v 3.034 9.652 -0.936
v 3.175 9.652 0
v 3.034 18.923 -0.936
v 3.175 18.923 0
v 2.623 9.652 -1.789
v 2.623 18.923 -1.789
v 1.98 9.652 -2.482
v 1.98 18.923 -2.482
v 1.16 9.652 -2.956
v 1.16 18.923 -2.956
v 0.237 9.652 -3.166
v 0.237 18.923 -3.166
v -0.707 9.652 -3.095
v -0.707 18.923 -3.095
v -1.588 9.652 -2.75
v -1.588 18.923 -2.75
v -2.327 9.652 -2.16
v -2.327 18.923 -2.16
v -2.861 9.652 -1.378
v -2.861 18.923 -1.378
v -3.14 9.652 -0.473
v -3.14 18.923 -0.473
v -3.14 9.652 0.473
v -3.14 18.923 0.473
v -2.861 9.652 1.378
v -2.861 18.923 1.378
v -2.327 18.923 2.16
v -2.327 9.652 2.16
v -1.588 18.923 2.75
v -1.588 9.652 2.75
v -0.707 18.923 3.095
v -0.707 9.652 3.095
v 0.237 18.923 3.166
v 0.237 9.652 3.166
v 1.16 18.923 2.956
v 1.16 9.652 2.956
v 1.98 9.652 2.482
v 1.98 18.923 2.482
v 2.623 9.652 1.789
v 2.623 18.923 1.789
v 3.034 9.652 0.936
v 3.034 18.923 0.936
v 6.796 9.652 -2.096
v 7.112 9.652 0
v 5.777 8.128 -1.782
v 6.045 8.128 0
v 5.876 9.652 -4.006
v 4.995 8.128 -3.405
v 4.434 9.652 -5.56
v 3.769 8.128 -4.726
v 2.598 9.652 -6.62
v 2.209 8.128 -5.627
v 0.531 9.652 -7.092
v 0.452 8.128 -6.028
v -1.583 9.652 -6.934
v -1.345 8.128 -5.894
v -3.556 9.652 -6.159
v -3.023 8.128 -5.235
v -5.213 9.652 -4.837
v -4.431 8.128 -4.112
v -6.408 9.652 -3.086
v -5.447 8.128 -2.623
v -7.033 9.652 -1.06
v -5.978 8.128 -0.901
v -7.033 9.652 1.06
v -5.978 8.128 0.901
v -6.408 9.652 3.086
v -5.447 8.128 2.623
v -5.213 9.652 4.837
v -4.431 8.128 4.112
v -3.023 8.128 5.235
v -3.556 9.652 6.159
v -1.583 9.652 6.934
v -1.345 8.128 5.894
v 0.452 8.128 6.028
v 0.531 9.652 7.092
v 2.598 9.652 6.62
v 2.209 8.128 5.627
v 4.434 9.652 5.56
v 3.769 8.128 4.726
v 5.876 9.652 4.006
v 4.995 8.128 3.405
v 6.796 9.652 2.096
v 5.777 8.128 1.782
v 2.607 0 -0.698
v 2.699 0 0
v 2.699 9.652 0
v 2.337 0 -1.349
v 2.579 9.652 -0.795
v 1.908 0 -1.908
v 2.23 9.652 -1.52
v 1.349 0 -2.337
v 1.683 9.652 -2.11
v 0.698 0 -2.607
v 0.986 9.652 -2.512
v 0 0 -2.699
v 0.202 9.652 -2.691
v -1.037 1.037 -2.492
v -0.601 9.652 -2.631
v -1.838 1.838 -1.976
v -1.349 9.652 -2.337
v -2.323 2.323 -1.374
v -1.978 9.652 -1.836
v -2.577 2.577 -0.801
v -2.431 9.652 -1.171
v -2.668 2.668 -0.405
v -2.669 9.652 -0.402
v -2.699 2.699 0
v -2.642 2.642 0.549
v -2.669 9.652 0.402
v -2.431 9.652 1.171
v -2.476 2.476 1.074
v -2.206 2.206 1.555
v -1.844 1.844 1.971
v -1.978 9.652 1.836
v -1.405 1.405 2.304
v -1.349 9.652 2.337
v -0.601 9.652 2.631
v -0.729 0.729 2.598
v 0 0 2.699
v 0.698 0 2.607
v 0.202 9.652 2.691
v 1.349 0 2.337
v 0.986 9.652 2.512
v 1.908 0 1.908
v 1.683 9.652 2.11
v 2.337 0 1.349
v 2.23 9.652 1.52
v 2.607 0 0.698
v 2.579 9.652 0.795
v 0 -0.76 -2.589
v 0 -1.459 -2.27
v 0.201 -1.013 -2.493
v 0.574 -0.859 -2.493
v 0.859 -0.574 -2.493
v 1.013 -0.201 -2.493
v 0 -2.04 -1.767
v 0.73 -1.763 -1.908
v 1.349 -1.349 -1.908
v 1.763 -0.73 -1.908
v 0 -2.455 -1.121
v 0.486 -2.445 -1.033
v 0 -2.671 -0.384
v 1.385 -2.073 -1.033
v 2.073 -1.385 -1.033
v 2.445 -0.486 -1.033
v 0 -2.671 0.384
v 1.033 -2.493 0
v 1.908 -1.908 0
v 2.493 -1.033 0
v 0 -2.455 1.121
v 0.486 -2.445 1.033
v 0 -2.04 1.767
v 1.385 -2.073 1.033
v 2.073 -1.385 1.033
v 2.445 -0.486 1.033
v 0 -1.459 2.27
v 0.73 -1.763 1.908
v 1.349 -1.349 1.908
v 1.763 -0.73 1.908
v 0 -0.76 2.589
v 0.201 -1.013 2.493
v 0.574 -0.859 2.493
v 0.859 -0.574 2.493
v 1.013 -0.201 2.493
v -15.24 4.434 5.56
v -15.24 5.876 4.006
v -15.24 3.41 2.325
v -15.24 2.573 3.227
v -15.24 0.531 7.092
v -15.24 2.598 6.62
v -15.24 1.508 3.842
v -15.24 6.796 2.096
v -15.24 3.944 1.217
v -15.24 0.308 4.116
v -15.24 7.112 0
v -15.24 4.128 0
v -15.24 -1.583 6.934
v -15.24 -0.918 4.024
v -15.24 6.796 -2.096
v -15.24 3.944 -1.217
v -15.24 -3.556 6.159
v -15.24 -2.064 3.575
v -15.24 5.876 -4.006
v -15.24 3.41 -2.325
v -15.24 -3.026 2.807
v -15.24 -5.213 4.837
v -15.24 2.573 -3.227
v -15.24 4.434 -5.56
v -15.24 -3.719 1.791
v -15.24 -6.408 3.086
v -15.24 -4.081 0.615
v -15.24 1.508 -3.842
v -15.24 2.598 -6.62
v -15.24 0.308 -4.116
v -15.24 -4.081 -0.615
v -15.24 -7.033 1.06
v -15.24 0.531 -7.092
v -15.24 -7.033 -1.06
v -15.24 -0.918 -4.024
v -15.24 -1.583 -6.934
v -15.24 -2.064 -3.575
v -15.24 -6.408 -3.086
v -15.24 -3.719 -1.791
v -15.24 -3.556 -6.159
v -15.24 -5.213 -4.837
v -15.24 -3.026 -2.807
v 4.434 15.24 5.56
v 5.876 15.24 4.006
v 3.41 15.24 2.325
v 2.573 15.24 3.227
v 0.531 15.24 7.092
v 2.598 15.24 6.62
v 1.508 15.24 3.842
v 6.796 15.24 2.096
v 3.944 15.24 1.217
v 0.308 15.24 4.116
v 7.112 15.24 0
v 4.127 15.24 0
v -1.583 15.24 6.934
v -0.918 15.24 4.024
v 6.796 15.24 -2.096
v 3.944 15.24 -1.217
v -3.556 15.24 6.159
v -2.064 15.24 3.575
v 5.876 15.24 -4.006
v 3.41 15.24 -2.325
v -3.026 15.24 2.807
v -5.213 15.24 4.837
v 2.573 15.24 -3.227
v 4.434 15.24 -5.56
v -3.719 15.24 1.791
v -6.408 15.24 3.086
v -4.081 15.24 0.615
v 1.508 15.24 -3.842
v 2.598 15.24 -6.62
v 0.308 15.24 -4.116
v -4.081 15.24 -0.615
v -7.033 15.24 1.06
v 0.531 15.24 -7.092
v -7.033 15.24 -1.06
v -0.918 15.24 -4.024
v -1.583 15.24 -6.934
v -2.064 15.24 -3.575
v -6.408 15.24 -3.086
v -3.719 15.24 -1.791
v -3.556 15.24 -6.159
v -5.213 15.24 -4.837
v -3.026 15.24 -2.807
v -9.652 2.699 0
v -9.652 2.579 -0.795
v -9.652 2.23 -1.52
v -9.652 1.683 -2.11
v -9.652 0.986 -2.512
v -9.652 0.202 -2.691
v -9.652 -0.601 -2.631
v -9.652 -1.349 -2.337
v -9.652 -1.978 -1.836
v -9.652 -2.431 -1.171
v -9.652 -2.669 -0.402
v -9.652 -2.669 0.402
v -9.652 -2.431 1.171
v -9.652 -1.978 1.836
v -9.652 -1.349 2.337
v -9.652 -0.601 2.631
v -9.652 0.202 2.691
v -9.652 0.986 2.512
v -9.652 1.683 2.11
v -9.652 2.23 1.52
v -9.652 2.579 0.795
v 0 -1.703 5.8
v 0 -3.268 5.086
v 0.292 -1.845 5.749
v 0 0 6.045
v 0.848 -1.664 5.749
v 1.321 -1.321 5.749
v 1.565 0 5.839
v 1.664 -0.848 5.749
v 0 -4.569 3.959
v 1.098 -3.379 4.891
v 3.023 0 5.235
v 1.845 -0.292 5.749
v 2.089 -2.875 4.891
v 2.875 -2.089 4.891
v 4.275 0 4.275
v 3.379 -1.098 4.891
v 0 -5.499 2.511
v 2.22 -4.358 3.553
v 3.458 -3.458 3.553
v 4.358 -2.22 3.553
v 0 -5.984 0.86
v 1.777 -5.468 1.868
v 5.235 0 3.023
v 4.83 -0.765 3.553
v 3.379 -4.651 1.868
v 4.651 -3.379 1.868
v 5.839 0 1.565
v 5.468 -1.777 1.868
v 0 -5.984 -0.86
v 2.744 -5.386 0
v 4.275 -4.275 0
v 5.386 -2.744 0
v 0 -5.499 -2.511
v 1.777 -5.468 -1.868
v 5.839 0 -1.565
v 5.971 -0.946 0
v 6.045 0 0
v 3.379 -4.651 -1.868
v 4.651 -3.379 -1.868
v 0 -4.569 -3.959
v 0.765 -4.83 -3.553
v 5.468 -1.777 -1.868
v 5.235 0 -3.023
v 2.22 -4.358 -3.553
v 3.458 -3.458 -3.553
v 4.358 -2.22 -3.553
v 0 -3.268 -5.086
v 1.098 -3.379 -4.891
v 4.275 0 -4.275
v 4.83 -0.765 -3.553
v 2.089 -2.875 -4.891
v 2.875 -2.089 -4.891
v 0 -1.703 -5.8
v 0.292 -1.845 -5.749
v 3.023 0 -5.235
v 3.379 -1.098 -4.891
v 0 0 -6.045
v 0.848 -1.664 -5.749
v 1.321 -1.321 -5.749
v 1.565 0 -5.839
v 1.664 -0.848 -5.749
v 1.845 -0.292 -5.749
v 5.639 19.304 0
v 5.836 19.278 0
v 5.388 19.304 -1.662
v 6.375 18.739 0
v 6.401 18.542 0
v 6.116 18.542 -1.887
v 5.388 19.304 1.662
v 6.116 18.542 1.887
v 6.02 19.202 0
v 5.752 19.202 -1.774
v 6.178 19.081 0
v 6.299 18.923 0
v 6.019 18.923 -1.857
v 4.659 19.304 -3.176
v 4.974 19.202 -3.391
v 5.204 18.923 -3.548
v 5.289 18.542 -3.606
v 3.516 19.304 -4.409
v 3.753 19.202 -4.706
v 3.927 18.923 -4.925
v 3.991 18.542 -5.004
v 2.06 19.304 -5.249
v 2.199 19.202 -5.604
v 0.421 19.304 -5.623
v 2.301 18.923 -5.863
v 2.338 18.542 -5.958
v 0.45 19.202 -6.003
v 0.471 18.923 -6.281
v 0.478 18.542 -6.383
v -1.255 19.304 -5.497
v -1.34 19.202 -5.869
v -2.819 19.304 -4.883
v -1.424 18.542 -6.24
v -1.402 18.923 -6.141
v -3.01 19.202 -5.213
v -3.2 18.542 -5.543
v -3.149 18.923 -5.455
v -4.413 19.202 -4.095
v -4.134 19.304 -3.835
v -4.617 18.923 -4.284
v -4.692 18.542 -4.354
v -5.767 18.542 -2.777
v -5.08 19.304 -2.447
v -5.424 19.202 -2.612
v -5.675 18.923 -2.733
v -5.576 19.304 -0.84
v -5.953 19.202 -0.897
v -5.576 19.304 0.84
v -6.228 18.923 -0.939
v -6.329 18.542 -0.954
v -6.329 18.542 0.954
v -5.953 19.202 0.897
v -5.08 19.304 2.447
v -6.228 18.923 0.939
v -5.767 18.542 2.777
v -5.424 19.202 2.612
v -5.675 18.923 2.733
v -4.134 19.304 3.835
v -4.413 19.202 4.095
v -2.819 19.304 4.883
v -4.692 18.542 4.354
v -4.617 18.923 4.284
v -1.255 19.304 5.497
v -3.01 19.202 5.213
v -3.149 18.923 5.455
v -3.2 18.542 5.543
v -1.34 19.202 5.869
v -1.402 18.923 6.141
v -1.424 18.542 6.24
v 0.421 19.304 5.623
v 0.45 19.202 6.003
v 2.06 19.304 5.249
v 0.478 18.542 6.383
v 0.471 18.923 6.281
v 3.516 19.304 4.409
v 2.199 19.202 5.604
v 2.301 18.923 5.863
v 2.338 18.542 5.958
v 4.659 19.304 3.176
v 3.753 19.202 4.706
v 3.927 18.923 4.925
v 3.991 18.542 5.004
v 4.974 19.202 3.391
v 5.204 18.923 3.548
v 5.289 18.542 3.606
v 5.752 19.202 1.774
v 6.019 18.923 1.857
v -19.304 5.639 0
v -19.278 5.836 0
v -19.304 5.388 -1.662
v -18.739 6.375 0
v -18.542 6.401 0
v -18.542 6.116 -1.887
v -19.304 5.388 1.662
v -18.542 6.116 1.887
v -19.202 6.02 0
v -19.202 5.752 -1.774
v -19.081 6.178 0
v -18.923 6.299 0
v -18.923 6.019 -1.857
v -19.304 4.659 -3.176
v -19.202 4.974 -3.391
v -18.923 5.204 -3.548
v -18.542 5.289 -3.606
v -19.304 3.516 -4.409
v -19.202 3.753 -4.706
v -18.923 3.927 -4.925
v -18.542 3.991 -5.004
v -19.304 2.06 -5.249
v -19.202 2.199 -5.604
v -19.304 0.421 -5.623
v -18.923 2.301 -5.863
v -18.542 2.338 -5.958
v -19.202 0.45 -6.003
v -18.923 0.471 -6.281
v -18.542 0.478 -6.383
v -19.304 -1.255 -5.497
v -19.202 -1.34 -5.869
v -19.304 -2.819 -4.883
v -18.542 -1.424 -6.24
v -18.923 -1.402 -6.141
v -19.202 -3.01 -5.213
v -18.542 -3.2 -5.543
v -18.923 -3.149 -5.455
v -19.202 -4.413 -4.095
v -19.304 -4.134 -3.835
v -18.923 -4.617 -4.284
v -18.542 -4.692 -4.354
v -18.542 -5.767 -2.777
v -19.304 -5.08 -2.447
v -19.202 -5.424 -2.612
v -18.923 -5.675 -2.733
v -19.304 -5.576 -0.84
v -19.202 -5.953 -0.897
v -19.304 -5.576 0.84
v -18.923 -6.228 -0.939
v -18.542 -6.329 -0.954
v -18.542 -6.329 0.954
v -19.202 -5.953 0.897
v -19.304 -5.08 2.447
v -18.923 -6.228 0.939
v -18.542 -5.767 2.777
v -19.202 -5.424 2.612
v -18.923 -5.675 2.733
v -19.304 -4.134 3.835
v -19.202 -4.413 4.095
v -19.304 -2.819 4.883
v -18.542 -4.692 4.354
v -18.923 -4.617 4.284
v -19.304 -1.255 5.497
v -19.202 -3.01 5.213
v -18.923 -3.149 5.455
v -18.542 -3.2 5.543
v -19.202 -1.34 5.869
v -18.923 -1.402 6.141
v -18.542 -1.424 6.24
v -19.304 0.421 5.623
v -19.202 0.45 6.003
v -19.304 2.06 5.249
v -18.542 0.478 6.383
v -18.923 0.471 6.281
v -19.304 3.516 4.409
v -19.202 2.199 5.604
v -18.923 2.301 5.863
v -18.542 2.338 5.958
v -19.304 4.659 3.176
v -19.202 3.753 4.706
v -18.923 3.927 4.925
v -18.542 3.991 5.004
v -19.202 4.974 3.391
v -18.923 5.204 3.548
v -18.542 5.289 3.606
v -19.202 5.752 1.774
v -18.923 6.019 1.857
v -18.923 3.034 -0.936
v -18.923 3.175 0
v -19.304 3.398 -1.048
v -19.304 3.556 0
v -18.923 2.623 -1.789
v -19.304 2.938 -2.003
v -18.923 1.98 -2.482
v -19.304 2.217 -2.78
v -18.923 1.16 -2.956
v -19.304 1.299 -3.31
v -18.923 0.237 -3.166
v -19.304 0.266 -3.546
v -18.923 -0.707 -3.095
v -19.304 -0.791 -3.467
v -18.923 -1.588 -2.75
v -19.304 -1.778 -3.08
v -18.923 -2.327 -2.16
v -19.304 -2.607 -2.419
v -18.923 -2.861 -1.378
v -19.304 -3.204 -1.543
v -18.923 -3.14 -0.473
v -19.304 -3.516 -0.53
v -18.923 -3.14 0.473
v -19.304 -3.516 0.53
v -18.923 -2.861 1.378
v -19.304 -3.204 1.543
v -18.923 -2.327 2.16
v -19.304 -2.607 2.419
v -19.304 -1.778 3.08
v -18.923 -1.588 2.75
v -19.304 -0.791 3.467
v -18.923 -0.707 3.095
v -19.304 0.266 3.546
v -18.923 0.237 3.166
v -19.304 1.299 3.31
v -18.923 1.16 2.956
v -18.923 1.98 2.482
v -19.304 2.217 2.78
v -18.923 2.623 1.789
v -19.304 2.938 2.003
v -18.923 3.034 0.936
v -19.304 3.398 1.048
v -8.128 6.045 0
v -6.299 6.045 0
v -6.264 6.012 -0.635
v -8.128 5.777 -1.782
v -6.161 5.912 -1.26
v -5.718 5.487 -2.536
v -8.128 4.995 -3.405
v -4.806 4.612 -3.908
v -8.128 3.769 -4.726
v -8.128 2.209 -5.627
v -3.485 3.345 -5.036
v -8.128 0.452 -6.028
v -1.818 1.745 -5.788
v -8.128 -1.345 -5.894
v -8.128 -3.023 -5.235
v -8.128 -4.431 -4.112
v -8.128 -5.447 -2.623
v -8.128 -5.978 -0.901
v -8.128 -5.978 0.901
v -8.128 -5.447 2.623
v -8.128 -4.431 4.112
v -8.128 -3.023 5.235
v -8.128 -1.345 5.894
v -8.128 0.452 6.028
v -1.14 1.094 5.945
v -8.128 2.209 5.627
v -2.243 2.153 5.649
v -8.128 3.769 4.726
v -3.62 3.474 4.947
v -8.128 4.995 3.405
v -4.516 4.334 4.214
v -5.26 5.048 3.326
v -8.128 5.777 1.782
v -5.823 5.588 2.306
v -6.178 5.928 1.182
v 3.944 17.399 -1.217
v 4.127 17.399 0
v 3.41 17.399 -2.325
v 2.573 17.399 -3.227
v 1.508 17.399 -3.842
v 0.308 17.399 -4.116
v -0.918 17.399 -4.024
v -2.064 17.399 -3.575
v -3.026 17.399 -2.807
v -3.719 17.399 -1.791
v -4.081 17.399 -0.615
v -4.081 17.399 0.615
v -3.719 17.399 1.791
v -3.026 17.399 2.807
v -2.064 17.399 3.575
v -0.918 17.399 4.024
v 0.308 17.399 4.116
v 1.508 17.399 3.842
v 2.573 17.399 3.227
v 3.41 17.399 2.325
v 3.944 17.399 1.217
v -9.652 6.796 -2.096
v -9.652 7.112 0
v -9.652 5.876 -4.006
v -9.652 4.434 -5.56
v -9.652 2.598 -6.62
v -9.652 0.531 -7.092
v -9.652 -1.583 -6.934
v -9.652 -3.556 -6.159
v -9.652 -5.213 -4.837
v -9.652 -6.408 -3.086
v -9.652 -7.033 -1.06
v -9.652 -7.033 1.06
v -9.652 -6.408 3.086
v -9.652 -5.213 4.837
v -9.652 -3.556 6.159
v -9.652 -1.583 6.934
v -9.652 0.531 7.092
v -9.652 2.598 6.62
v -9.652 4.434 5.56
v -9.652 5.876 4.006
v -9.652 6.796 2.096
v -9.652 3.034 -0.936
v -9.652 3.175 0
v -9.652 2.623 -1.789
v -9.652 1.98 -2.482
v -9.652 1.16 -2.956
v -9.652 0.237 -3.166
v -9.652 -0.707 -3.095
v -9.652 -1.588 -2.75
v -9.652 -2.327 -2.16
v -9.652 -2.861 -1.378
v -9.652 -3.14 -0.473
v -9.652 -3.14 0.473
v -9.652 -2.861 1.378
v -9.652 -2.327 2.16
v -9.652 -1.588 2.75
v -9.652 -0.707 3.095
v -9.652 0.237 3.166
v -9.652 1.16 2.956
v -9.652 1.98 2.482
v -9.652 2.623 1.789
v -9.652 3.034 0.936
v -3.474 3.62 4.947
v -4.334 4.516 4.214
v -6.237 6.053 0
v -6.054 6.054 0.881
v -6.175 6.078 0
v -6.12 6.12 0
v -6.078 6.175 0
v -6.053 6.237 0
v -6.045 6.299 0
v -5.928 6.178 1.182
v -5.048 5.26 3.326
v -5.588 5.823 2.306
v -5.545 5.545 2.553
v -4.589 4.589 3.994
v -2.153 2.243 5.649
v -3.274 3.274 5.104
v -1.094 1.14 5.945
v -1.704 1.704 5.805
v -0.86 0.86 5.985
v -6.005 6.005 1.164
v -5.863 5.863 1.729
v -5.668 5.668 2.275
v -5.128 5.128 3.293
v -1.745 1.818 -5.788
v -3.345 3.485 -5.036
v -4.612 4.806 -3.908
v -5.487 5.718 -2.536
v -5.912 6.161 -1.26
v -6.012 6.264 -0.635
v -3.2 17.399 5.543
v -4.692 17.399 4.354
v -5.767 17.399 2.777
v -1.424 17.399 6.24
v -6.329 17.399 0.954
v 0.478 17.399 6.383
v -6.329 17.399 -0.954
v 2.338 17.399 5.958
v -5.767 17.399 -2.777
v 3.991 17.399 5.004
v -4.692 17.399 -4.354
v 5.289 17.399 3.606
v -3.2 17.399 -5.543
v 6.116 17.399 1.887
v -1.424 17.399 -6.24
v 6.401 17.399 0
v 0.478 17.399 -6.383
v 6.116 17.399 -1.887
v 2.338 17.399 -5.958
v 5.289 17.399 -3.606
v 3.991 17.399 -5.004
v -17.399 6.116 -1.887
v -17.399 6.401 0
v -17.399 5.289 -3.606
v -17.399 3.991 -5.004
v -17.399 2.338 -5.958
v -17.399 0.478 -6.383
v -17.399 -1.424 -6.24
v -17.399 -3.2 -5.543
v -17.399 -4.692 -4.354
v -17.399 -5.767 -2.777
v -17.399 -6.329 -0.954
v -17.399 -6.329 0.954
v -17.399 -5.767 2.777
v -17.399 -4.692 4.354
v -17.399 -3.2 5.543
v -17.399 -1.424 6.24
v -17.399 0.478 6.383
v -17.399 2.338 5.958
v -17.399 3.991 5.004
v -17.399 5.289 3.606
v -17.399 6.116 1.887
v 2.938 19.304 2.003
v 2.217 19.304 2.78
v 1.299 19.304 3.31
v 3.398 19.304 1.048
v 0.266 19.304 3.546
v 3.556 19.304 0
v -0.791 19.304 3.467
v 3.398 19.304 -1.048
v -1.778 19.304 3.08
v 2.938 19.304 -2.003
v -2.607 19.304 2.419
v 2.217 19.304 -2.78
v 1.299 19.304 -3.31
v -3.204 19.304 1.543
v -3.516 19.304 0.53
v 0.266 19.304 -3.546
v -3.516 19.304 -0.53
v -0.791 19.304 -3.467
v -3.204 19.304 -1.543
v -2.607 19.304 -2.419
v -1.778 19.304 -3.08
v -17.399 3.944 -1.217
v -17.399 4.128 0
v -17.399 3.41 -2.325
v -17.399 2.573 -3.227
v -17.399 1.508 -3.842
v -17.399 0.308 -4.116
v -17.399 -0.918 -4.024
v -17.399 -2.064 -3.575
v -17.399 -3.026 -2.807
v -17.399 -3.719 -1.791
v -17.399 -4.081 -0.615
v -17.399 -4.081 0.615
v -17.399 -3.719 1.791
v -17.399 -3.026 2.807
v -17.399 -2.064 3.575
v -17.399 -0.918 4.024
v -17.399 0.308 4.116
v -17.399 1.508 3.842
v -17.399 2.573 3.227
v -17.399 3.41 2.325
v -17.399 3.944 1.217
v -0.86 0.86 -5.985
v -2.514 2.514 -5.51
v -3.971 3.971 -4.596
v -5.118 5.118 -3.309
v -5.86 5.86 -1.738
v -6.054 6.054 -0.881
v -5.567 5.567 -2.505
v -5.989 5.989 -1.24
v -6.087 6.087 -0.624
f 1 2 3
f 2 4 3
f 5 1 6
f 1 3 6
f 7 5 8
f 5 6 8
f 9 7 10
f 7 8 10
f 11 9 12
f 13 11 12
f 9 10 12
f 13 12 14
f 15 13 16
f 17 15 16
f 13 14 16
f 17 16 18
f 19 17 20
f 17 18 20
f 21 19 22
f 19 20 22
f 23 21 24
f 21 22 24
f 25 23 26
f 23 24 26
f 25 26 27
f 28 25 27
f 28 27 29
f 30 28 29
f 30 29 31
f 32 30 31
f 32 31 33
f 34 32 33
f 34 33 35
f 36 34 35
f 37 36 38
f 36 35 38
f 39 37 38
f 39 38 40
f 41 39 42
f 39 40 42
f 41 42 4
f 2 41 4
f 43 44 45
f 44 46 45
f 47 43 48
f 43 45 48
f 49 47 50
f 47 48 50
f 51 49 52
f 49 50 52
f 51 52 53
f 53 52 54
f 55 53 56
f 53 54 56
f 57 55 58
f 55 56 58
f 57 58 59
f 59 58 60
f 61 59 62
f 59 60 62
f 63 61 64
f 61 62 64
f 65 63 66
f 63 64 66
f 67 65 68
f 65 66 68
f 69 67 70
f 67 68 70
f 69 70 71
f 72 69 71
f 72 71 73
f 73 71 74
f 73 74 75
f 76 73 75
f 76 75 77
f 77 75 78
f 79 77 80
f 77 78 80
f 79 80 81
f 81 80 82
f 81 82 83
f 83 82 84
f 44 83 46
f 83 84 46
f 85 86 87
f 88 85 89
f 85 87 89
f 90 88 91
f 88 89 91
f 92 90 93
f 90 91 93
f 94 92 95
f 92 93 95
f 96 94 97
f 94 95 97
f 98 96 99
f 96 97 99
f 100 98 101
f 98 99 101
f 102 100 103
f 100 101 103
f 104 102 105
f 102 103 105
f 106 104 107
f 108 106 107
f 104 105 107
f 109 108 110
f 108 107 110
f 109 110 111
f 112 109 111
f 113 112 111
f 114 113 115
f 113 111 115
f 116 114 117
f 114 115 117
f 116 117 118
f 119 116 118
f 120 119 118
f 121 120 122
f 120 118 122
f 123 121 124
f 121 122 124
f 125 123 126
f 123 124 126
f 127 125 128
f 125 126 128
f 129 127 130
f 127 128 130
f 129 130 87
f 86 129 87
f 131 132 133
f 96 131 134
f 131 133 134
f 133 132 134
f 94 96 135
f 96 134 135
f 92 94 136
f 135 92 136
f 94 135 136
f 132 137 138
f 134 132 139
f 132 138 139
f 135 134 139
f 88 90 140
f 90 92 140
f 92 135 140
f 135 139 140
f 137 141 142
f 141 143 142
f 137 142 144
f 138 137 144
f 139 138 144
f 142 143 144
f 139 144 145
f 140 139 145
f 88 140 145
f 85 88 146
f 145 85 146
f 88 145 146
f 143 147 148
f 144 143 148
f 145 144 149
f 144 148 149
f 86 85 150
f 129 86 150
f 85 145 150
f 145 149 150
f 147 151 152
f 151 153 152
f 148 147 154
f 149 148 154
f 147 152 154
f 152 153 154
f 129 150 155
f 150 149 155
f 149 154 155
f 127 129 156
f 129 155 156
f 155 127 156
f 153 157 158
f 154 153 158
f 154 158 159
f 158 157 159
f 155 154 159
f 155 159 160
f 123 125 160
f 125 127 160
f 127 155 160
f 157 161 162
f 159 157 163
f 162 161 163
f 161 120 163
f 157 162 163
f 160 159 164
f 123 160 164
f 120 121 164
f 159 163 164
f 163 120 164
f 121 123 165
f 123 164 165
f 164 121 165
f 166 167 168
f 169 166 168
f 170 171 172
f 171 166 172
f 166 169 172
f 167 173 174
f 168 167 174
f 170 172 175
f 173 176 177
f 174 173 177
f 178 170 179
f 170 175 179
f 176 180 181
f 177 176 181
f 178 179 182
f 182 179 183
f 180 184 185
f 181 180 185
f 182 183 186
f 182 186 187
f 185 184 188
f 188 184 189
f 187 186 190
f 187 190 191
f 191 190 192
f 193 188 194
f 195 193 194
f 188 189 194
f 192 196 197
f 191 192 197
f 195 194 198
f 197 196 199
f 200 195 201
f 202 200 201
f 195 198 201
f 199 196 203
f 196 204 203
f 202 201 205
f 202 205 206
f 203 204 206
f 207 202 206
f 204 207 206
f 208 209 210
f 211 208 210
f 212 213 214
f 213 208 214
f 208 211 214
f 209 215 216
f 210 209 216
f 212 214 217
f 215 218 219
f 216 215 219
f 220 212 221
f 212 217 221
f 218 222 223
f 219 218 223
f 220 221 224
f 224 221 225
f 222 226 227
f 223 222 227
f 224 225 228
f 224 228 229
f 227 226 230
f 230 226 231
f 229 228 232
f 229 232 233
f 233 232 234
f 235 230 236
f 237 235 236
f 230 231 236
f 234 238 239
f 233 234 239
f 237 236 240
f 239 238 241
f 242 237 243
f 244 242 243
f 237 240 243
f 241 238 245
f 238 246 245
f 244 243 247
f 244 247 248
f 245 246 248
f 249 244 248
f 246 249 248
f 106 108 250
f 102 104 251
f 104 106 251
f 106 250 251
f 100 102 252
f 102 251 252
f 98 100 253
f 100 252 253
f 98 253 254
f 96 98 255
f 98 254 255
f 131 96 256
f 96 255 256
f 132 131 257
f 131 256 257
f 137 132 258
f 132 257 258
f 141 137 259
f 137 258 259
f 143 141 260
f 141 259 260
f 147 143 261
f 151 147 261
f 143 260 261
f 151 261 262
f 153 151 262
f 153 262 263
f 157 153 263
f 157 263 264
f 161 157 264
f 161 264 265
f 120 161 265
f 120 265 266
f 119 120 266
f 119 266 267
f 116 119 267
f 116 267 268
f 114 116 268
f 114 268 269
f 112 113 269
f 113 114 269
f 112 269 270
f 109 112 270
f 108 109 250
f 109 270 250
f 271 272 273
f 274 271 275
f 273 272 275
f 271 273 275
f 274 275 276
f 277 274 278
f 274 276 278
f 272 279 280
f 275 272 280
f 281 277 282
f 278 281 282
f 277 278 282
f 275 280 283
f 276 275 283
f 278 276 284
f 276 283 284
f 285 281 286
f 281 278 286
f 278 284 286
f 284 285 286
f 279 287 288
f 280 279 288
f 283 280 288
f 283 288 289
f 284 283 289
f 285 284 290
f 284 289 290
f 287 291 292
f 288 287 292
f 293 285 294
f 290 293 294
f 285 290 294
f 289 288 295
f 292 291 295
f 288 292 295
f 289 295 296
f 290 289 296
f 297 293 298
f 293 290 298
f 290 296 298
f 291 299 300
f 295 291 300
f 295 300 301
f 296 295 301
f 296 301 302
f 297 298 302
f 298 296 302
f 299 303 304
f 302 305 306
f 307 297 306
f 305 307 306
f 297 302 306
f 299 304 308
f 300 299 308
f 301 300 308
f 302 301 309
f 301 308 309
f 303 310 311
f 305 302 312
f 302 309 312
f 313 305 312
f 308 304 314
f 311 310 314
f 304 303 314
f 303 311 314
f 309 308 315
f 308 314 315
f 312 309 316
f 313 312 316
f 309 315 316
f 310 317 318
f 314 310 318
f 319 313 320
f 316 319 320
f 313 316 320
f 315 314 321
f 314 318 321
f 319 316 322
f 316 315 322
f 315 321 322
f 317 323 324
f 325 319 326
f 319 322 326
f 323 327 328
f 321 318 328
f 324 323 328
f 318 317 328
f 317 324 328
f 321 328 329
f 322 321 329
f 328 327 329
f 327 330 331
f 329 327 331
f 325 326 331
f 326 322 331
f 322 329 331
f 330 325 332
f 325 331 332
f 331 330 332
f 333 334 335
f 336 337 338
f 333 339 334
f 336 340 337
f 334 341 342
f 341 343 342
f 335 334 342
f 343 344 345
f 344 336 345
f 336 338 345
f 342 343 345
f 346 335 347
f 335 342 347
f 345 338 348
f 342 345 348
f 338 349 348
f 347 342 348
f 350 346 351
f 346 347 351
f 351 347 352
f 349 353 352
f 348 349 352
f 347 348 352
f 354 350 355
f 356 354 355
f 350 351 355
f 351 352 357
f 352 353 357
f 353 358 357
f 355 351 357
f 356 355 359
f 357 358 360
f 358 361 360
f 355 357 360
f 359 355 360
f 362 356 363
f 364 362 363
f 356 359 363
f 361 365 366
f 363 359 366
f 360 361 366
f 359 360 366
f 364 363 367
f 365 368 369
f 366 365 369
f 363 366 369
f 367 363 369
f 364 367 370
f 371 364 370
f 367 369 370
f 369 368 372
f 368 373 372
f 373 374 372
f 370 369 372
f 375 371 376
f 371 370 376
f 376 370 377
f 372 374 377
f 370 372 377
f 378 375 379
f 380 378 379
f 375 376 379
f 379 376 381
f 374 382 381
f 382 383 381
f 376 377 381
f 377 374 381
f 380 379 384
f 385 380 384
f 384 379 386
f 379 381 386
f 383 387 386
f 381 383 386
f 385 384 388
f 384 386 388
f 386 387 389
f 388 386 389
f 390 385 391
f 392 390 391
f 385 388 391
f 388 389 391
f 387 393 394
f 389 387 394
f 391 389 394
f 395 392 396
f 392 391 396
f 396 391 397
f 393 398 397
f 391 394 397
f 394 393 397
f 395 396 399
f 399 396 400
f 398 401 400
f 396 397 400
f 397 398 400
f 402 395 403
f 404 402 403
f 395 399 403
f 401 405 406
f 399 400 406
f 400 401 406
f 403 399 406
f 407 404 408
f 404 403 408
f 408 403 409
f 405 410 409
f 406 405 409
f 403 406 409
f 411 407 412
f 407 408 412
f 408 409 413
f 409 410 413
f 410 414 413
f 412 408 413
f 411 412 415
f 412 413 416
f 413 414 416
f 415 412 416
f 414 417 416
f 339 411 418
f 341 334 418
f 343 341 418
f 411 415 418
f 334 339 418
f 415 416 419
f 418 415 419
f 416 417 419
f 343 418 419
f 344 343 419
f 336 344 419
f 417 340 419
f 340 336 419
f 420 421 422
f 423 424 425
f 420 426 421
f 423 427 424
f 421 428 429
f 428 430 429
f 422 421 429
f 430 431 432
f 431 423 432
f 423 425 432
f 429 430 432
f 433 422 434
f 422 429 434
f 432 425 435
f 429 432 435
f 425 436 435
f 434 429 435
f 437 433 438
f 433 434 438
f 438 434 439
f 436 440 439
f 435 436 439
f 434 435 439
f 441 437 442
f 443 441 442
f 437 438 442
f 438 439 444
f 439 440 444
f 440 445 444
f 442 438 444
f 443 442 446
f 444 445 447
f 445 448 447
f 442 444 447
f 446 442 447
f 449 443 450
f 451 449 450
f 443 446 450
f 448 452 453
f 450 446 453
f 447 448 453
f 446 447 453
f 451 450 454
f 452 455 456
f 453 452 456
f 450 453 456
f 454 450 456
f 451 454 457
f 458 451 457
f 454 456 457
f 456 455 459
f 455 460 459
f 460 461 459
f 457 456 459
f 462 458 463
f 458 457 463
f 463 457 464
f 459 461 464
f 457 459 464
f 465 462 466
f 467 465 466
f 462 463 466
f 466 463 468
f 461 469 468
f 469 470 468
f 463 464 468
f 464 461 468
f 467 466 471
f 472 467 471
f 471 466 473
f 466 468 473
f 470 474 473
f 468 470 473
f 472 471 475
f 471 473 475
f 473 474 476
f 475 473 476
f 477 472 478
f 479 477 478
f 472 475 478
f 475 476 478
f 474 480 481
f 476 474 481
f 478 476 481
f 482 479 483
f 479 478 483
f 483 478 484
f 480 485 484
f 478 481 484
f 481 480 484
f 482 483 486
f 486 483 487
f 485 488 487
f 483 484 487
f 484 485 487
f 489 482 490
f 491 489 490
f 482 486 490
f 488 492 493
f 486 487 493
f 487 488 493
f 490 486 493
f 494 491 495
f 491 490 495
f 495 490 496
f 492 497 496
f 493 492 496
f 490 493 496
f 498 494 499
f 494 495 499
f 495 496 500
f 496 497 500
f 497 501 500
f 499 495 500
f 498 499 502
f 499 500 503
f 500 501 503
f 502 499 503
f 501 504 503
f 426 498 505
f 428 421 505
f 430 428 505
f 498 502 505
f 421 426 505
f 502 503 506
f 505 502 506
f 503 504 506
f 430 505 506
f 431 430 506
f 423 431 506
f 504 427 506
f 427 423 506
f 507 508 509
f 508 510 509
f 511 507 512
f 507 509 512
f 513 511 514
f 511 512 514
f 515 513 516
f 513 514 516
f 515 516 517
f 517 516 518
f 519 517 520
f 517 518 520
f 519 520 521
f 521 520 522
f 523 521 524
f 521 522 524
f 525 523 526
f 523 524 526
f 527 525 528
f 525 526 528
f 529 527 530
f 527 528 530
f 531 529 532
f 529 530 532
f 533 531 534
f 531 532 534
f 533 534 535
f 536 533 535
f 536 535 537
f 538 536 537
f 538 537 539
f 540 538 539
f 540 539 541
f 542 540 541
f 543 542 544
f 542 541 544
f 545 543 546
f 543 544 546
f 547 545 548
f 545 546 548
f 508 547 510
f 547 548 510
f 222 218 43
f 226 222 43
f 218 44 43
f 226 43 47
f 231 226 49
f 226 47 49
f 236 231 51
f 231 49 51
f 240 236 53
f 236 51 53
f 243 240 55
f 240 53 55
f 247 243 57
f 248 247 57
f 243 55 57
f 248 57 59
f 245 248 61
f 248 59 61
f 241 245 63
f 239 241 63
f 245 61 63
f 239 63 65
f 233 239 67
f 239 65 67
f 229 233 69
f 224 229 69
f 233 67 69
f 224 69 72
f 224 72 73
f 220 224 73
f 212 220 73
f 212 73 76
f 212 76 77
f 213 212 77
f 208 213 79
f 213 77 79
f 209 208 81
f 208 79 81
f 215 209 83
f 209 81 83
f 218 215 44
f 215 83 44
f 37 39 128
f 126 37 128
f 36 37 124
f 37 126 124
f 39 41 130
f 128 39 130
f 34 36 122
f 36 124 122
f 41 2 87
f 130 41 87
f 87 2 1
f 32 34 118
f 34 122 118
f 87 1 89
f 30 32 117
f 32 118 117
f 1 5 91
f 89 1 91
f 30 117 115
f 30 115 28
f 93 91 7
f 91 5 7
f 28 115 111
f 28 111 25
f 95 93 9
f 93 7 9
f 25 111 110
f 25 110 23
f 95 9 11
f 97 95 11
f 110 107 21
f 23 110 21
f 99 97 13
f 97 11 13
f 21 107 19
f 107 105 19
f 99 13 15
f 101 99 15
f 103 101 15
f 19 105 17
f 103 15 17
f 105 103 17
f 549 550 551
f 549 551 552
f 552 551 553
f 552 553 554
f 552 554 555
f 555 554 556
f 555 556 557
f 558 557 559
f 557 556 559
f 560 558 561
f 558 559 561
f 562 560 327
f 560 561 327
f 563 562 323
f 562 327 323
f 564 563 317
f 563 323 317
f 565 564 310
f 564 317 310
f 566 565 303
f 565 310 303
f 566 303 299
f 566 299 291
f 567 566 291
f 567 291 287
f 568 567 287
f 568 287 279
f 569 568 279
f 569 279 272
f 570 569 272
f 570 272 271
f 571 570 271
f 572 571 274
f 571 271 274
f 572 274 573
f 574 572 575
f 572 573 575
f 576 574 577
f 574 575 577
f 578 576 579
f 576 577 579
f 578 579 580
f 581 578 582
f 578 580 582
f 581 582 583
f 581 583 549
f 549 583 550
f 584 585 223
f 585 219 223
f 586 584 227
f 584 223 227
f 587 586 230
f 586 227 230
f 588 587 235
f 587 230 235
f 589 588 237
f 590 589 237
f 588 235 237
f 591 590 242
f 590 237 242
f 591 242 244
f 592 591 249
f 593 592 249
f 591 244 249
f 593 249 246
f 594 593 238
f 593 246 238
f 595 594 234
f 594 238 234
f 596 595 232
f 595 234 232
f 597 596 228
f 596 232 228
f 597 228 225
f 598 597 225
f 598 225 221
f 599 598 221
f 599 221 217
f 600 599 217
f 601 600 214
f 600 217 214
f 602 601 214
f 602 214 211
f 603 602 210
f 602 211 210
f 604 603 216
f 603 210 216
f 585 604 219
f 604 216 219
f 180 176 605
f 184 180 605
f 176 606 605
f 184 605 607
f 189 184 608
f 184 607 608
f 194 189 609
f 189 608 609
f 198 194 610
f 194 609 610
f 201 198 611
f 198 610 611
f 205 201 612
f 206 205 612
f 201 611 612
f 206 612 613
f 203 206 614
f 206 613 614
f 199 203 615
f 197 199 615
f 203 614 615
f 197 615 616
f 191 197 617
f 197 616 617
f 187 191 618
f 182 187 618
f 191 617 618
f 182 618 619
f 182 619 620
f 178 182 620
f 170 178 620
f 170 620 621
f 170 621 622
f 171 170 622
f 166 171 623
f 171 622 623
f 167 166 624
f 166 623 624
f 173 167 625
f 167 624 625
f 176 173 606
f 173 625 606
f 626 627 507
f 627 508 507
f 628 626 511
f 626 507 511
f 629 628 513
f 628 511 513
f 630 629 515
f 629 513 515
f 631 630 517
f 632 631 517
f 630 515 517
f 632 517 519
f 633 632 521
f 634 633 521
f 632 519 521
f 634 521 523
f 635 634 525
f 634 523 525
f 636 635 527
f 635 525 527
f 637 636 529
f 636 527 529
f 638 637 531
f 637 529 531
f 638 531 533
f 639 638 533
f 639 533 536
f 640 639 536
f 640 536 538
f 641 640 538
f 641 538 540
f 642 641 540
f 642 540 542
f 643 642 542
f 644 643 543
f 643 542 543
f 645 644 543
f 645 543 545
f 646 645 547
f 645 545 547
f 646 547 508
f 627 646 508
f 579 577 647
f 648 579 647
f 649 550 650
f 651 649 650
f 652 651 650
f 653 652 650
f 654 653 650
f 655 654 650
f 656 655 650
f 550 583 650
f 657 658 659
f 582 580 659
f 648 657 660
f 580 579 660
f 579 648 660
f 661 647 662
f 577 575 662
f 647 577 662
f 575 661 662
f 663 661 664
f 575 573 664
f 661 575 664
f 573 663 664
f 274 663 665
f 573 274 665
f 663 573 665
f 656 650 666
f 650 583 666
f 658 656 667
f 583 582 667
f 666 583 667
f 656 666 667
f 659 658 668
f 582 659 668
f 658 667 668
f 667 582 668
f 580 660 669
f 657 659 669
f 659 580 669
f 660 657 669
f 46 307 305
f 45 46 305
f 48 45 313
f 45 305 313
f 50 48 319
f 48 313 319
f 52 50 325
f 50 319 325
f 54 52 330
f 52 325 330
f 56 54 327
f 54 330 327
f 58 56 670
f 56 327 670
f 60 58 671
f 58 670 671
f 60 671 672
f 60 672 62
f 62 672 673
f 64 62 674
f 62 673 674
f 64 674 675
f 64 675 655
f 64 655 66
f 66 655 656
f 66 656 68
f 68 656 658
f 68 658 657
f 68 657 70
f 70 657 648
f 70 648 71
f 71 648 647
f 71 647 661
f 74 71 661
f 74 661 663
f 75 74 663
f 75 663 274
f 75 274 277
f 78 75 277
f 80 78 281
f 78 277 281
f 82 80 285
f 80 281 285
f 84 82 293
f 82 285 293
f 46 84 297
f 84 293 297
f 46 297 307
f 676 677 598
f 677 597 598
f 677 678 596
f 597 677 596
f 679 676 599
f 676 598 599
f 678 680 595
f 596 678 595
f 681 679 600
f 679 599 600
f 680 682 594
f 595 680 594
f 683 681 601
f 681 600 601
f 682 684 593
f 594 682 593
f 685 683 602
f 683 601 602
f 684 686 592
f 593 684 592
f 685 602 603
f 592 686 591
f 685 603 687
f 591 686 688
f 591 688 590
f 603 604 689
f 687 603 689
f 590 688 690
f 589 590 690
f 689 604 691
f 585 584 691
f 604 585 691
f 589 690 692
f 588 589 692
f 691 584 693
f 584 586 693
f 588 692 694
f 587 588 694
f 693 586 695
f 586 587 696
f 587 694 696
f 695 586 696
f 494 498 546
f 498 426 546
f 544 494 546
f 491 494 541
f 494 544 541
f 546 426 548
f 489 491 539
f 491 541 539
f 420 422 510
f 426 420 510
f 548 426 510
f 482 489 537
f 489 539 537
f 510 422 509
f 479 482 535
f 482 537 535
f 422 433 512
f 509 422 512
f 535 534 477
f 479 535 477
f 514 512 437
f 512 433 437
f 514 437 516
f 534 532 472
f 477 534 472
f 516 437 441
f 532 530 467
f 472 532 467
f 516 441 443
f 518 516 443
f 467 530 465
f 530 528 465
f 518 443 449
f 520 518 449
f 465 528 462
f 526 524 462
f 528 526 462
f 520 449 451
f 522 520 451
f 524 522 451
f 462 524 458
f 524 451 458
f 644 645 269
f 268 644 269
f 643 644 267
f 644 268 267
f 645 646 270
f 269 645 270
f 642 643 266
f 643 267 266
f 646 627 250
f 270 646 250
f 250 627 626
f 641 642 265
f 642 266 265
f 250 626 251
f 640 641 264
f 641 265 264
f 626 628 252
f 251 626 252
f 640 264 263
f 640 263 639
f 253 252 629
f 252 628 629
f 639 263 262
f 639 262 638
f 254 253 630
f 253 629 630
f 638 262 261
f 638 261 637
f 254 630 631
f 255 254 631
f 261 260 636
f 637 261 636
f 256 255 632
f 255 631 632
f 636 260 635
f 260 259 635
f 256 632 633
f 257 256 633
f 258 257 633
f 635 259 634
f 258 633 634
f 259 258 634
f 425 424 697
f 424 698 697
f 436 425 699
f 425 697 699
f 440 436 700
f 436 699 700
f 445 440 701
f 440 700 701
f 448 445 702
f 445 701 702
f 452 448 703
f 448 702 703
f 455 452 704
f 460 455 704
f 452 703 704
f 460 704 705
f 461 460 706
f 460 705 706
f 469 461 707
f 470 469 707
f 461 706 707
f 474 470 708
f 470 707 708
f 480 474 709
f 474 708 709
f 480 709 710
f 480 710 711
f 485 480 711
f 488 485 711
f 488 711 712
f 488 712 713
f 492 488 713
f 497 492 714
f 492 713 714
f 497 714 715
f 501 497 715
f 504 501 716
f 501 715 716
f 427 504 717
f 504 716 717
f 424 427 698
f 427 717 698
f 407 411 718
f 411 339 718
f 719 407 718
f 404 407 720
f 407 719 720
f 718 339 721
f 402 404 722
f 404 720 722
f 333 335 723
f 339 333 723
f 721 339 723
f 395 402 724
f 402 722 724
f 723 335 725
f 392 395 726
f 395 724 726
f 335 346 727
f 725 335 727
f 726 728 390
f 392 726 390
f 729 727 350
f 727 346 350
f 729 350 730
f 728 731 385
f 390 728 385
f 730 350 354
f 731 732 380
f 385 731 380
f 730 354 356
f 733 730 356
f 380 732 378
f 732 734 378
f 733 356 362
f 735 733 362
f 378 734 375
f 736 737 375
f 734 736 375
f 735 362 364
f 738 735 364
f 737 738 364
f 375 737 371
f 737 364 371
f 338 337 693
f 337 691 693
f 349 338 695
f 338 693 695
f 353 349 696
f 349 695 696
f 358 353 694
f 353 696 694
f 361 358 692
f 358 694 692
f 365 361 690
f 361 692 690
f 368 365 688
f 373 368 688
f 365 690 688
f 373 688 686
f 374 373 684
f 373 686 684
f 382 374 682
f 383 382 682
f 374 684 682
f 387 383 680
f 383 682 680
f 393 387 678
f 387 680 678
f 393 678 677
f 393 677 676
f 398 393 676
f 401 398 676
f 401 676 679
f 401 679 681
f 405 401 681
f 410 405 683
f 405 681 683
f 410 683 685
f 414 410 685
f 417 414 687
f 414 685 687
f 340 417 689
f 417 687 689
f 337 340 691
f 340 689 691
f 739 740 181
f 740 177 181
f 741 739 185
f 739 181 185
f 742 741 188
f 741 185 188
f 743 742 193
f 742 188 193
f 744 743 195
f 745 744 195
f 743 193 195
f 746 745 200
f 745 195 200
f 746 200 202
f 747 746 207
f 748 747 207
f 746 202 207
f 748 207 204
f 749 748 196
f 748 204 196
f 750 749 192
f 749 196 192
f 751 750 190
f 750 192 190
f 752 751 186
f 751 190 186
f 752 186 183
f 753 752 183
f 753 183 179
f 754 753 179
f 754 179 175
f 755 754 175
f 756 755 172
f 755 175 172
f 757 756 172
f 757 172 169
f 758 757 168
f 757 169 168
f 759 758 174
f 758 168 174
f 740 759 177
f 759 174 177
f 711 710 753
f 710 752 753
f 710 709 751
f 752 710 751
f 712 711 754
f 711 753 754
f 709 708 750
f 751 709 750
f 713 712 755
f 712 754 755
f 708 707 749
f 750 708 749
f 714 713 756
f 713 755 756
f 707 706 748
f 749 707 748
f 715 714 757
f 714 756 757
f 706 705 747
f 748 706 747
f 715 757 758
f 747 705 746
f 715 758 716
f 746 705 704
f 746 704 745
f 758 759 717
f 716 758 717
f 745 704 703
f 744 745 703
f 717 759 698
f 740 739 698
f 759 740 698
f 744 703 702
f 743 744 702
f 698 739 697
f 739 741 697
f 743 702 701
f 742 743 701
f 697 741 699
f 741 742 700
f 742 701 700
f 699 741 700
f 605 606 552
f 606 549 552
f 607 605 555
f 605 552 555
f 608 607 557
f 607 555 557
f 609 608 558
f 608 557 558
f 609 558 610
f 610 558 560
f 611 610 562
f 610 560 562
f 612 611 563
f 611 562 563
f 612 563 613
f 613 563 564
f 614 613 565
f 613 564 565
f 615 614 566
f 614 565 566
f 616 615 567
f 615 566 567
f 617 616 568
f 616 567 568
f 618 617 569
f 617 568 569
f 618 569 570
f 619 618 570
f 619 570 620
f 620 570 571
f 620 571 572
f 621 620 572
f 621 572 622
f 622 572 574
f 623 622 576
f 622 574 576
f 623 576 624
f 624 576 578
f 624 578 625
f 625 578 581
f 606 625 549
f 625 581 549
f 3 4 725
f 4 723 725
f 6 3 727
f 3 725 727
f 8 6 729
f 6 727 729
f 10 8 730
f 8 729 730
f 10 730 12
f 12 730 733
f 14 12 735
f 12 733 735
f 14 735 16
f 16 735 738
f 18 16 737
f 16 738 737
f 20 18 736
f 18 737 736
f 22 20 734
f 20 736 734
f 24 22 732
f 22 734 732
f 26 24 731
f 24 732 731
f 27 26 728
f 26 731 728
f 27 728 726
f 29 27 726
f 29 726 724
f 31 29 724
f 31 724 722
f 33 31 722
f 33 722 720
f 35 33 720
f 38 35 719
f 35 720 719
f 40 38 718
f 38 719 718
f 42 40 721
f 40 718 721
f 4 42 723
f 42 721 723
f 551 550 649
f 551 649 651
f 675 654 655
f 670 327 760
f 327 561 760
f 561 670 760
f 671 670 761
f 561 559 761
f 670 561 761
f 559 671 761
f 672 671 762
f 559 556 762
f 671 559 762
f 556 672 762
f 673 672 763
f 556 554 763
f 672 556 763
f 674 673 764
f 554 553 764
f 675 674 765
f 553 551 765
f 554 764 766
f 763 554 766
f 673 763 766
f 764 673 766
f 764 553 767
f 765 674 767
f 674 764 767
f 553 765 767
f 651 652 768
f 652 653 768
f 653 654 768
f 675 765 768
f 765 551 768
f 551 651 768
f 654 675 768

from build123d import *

# Parameters (mm, degrees)
CIRPATTERN1_COUNT  = 2
CIRPATTERN1_ANGLE  = 90
SKETCH5_R          = 2.69875
CUT_EXTRUDE3_DEPTH = 29.211156942
SKETCH6_R          = 2.69875
CUT_EXTRUDE4_DEPTH = 29.211156942
REVOLVE2_ANGLE     = 90
FILLET1_R          = 0.254


with BuildPart() as part:
    # Sketch1 → Revolve1 (revolve)
    with BuildSketch(Plane.XY):
        with BuildLine():
            Line((-15.24, 7.112), (-9.652, 7.112))
            Line((-9.652, 7.112), (-8.128451706, 6.0452))
            Line((-8.128451706, 6.0452), (0, 6.0452))
            Line((0, 6.0452), (0, 2.69875))
            Line((0, 2.69875), (-9.652, 2.69875))
            Line((-9.652, 2.69875), (-9.652, 3.175))
            Line((-9.652, 3.175), (-18.923, 3.175))
            Line((-18.923, 3.175), (-19.304, 3.556))
            Line((-19.304, 3.556), (-19.304, 5.6388))
            ThreePointArc((-19.304, 5.6388), (-19.080815367, 6.177615367), (-18.542, 6.4008))
            Line((-18.542, 6.4008), (-17.399, 6.4008))
            Line((-17.399, 6.4008), (-17.399, 4.1275))
            Line((-17.399, 4.1275), (-15.24, 4.1275))
            Line((-15.24, 4.1275), (-15.24, 7.112))
        make_face()
    revolve1 = revolve(axis=Axis((0, 0, 0), (-1, 0, 0)))

    # CirPattern1: Revolve1 ×2 about axis
    cirpattern1_axis = Axis((0, 0, -6.0452), (0, 0, -1))
    for i in range(1, CIRPATTERN1_COUNT):
        add(revolve1.rotate(cirpattern1_axis, i * CIRPATTERN1_ANGLE / (CIRPATTERN1_COUNT - 1)))

    # Sketch5 → Cut-Extrude3 (cut, through all)
    with BuildSketch(Plane.XZ):
        Circle(SKETCH5_R)
    extrude(amount=-CUT_EXTRUDE3_DEPTH, mode=Mode.SUBTRACT)

    # Sketch6 → Cut-Extrude4 (cut, through all)
    with BuildSketch(Plane(origin=(0, 0, 0), x_dir=(0, 0, -1), z_dir=(1, 0, 0))):
        with Locations(Location((0, 0, 0), (0, 0, 90))):
            Circle(SKETCH6_R)
    extrude(amount=-CUT_EXTRUDE4_DEPTH, mode=Mode.SUBTRACT)

    # Sketch7 → Revolve2 (revolve)
    with BuildSketch(Plane(origin=(0, 0, 0), x_dir=(0, 0, -1), z_dir=(1, 0, 0))):
        with BuildLine():
            Line((-2.69875, 0), (-6.0452, 0))
            ThreePointArc((-6.0452, 0), (0, -6.0452), (6.0452, 0))
            Line((6.0452, 0), (2.69875, 0))
            ThreePointArc((2.69875, 0), (0, -2.69875), (-2.69875, 0))
        make_face()
    revolve(axis=Axis((0, 0, -2.69875), (0, 0, 1)), revolution_arc=REVOLVE2_ANGLE)

    # Fillet1
    fillet1_edges = [part.edges().sort_by_distance(p)[0] for p in [
        (-3.905494855, 3.905494855, -4.614277081),
    ]]
    fillet(fillet1_edges, radius=FILLET1_R)


solid = part.part
